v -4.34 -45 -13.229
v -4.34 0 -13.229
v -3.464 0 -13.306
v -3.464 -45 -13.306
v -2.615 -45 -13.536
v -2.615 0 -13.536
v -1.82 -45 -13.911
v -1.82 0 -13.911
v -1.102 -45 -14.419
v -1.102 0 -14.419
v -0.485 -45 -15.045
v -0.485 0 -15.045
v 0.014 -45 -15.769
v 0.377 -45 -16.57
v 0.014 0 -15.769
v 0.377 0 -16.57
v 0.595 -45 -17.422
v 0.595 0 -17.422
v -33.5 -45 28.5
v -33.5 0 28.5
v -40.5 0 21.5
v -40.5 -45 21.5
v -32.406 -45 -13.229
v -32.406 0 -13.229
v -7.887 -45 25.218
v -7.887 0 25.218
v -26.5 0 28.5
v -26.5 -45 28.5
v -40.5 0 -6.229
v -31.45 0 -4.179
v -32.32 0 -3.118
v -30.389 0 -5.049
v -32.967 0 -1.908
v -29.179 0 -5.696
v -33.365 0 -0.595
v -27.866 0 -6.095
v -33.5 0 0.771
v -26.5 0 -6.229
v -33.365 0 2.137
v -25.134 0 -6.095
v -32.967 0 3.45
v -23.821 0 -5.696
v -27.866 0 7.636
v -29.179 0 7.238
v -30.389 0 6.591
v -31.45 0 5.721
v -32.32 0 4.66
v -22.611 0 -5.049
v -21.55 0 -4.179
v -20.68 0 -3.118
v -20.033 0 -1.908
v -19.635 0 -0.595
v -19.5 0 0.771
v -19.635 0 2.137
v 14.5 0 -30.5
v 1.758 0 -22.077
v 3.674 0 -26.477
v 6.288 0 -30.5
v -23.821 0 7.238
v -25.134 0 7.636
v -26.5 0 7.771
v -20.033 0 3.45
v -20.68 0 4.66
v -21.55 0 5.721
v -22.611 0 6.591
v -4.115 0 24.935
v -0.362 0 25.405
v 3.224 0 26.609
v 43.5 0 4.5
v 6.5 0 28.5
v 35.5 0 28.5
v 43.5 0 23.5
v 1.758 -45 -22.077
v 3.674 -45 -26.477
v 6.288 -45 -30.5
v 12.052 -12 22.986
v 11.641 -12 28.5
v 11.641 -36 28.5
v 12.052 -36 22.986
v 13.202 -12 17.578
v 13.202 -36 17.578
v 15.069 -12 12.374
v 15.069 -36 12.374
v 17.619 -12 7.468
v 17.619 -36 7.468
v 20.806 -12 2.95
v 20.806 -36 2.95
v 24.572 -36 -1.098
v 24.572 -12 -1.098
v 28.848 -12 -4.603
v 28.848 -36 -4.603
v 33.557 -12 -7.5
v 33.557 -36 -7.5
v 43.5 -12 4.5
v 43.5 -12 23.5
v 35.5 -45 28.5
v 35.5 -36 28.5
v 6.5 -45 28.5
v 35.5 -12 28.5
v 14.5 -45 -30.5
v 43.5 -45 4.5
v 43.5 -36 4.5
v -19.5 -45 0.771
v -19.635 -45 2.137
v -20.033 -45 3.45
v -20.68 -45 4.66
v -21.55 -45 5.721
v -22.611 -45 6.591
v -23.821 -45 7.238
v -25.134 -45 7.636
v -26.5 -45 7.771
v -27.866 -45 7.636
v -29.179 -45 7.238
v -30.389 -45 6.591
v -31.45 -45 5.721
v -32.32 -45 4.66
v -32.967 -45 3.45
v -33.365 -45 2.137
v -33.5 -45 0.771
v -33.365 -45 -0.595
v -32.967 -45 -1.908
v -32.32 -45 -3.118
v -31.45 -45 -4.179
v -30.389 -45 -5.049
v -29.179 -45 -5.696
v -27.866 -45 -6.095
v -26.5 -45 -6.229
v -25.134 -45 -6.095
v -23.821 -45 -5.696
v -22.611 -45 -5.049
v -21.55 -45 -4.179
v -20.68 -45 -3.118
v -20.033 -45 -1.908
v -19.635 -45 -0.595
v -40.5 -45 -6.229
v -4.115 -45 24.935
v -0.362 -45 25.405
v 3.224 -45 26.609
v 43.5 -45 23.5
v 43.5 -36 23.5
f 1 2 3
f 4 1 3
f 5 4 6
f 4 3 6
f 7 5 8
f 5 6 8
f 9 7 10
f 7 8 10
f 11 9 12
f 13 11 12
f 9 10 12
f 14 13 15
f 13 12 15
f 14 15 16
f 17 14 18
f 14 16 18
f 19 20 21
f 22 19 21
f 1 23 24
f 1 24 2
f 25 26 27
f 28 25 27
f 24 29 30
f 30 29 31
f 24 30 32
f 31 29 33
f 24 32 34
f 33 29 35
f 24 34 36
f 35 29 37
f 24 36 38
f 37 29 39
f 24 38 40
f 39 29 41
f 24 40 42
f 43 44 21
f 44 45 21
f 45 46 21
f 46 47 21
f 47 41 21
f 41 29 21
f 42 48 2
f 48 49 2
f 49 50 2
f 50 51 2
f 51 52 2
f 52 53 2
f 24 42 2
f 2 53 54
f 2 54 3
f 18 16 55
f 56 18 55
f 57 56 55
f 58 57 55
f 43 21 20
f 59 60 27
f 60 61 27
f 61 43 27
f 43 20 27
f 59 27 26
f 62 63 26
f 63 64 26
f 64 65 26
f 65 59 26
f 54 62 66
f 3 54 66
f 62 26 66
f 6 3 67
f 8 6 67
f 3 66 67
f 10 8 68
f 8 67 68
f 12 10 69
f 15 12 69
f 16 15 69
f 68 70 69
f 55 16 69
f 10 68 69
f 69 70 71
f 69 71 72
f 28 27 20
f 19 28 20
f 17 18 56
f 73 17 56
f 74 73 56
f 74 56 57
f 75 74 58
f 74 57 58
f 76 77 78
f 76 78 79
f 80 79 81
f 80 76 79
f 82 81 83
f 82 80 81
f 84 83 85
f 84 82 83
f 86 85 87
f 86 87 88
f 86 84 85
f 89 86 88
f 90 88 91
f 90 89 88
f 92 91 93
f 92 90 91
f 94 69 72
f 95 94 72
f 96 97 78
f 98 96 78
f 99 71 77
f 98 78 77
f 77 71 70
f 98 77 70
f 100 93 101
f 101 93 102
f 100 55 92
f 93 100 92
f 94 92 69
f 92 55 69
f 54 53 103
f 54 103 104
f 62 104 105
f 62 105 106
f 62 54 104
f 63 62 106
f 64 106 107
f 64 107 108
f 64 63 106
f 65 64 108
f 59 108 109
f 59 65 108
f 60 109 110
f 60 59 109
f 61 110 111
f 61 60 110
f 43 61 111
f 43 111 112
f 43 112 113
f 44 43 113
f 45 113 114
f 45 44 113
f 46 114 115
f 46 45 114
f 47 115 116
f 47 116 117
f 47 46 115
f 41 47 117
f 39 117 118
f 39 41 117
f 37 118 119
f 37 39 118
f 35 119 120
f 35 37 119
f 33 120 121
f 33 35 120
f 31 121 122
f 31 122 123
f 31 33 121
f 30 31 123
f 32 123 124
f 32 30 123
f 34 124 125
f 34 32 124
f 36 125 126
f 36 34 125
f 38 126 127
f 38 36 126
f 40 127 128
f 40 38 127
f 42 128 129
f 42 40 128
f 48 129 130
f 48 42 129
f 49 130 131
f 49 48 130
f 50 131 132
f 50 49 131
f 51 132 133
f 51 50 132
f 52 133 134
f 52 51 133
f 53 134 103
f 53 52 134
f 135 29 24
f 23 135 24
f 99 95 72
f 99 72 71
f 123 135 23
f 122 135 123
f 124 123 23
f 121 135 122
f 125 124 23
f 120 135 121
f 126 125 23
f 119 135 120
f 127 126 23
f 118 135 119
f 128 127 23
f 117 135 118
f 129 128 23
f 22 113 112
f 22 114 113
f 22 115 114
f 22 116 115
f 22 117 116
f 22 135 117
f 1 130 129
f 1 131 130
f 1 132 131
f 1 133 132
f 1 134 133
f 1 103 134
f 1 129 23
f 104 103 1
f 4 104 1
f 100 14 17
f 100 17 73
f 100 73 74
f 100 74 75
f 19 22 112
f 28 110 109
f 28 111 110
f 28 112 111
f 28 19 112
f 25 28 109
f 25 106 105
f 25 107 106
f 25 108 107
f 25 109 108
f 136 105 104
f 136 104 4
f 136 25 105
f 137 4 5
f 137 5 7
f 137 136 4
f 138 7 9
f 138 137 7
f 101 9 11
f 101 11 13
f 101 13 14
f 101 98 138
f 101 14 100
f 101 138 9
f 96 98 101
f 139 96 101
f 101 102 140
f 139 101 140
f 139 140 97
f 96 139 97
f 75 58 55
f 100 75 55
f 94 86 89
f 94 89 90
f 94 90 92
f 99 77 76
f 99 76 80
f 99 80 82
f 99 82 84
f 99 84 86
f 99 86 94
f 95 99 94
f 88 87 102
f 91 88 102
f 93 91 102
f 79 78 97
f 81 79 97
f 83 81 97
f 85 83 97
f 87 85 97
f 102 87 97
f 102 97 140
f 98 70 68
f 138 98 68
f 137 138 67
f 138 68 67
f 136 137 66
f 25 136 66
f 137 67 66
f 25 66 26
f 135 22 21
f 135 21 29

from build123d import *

# Parameters (mm, degrees)
F0_R          = 7
F1_DEPTH      = 45
F4_DEPTH      = 10.5
F4_DEPTH_BACK = 13.5


with BuildPart() as f1:
    # F0 (on Front) → F1 (new body)
    with BuildSketch(Plane.XZ):
        with BuildLine():
            Line((-33.5, 28.5), (-40.5, 21.5))
            Line((-40.5, 21.5), (-40.5, -6.2290436868))
            Line((-40.5, -6.2290436868), (-32.4062898078, -13.2290436868))
            Line((-32.4062898078, -13.2290436868), (-4.3396635525, -13.2290436868))
            ThreePointArc((-4.3396635525, -13.2290436868), (-1.1020136669, -14.4188437946), (0.5947737455, -17.4219943993))
            ThreePointArc((0.5947737455, -17.4219943993), (2.6248372639, -24.3164832501), (6.2880673968, -30.5))
            Line((6.2880673968, -30.5), (14.5, -30.5))
            Line((14.5, -30.5), (43.5, 4.5))
            Line((43.5, 4.5), (43.5, 23.5))
            Line((43.5, 23.5), (35.5, 28.5))
            Line((35.5, 28.5), (6.5, 28.5))
            ThreePointArc((6.5, 28.5), (-0.361821699, 25.4052447636), (-7.8869164215, 25.2180111709))
            Line((-7.8869164215, 25.2180111709), (-26.5, 28.5))
            Line((-26.5, 28.5), (-33.5, 28.5))
        make_face()
        with Locations((-26.5, 0.7709563132)):
            Circle(F0_R, mode=Mode.SUBTRACT)
    extrude(amount=F1_DEPTH)

    # F3 (on offset) → F4 (cut, two sides)
    with BuildSketch(Plane.XZ.offset(22.5)) as f4_sk:
        with BuildLine():
            Line((35.5, 28.5), (11.6408265143, 28.5))
            ThreePointArc((11.6408265143, 28.5), (17.6190851715, 7.4683040803), (33.5571428571, -7.5))
            Line((33.5571428571, -7.5), (43.5, 4.5))
            Line((43.5, 4.5), (43.5, 23.5))
            Line((43.5, 23.5), (35.5, 28.5))
        make_face()
    extrude(amount=-F4_DEPTH, mode=Mode.SUBTRACT)
    extrude(f4_sk.sketch, amount=F4_DEPTH_BACK, mode=Mode.SUBTRACT)


solid = f1.part
